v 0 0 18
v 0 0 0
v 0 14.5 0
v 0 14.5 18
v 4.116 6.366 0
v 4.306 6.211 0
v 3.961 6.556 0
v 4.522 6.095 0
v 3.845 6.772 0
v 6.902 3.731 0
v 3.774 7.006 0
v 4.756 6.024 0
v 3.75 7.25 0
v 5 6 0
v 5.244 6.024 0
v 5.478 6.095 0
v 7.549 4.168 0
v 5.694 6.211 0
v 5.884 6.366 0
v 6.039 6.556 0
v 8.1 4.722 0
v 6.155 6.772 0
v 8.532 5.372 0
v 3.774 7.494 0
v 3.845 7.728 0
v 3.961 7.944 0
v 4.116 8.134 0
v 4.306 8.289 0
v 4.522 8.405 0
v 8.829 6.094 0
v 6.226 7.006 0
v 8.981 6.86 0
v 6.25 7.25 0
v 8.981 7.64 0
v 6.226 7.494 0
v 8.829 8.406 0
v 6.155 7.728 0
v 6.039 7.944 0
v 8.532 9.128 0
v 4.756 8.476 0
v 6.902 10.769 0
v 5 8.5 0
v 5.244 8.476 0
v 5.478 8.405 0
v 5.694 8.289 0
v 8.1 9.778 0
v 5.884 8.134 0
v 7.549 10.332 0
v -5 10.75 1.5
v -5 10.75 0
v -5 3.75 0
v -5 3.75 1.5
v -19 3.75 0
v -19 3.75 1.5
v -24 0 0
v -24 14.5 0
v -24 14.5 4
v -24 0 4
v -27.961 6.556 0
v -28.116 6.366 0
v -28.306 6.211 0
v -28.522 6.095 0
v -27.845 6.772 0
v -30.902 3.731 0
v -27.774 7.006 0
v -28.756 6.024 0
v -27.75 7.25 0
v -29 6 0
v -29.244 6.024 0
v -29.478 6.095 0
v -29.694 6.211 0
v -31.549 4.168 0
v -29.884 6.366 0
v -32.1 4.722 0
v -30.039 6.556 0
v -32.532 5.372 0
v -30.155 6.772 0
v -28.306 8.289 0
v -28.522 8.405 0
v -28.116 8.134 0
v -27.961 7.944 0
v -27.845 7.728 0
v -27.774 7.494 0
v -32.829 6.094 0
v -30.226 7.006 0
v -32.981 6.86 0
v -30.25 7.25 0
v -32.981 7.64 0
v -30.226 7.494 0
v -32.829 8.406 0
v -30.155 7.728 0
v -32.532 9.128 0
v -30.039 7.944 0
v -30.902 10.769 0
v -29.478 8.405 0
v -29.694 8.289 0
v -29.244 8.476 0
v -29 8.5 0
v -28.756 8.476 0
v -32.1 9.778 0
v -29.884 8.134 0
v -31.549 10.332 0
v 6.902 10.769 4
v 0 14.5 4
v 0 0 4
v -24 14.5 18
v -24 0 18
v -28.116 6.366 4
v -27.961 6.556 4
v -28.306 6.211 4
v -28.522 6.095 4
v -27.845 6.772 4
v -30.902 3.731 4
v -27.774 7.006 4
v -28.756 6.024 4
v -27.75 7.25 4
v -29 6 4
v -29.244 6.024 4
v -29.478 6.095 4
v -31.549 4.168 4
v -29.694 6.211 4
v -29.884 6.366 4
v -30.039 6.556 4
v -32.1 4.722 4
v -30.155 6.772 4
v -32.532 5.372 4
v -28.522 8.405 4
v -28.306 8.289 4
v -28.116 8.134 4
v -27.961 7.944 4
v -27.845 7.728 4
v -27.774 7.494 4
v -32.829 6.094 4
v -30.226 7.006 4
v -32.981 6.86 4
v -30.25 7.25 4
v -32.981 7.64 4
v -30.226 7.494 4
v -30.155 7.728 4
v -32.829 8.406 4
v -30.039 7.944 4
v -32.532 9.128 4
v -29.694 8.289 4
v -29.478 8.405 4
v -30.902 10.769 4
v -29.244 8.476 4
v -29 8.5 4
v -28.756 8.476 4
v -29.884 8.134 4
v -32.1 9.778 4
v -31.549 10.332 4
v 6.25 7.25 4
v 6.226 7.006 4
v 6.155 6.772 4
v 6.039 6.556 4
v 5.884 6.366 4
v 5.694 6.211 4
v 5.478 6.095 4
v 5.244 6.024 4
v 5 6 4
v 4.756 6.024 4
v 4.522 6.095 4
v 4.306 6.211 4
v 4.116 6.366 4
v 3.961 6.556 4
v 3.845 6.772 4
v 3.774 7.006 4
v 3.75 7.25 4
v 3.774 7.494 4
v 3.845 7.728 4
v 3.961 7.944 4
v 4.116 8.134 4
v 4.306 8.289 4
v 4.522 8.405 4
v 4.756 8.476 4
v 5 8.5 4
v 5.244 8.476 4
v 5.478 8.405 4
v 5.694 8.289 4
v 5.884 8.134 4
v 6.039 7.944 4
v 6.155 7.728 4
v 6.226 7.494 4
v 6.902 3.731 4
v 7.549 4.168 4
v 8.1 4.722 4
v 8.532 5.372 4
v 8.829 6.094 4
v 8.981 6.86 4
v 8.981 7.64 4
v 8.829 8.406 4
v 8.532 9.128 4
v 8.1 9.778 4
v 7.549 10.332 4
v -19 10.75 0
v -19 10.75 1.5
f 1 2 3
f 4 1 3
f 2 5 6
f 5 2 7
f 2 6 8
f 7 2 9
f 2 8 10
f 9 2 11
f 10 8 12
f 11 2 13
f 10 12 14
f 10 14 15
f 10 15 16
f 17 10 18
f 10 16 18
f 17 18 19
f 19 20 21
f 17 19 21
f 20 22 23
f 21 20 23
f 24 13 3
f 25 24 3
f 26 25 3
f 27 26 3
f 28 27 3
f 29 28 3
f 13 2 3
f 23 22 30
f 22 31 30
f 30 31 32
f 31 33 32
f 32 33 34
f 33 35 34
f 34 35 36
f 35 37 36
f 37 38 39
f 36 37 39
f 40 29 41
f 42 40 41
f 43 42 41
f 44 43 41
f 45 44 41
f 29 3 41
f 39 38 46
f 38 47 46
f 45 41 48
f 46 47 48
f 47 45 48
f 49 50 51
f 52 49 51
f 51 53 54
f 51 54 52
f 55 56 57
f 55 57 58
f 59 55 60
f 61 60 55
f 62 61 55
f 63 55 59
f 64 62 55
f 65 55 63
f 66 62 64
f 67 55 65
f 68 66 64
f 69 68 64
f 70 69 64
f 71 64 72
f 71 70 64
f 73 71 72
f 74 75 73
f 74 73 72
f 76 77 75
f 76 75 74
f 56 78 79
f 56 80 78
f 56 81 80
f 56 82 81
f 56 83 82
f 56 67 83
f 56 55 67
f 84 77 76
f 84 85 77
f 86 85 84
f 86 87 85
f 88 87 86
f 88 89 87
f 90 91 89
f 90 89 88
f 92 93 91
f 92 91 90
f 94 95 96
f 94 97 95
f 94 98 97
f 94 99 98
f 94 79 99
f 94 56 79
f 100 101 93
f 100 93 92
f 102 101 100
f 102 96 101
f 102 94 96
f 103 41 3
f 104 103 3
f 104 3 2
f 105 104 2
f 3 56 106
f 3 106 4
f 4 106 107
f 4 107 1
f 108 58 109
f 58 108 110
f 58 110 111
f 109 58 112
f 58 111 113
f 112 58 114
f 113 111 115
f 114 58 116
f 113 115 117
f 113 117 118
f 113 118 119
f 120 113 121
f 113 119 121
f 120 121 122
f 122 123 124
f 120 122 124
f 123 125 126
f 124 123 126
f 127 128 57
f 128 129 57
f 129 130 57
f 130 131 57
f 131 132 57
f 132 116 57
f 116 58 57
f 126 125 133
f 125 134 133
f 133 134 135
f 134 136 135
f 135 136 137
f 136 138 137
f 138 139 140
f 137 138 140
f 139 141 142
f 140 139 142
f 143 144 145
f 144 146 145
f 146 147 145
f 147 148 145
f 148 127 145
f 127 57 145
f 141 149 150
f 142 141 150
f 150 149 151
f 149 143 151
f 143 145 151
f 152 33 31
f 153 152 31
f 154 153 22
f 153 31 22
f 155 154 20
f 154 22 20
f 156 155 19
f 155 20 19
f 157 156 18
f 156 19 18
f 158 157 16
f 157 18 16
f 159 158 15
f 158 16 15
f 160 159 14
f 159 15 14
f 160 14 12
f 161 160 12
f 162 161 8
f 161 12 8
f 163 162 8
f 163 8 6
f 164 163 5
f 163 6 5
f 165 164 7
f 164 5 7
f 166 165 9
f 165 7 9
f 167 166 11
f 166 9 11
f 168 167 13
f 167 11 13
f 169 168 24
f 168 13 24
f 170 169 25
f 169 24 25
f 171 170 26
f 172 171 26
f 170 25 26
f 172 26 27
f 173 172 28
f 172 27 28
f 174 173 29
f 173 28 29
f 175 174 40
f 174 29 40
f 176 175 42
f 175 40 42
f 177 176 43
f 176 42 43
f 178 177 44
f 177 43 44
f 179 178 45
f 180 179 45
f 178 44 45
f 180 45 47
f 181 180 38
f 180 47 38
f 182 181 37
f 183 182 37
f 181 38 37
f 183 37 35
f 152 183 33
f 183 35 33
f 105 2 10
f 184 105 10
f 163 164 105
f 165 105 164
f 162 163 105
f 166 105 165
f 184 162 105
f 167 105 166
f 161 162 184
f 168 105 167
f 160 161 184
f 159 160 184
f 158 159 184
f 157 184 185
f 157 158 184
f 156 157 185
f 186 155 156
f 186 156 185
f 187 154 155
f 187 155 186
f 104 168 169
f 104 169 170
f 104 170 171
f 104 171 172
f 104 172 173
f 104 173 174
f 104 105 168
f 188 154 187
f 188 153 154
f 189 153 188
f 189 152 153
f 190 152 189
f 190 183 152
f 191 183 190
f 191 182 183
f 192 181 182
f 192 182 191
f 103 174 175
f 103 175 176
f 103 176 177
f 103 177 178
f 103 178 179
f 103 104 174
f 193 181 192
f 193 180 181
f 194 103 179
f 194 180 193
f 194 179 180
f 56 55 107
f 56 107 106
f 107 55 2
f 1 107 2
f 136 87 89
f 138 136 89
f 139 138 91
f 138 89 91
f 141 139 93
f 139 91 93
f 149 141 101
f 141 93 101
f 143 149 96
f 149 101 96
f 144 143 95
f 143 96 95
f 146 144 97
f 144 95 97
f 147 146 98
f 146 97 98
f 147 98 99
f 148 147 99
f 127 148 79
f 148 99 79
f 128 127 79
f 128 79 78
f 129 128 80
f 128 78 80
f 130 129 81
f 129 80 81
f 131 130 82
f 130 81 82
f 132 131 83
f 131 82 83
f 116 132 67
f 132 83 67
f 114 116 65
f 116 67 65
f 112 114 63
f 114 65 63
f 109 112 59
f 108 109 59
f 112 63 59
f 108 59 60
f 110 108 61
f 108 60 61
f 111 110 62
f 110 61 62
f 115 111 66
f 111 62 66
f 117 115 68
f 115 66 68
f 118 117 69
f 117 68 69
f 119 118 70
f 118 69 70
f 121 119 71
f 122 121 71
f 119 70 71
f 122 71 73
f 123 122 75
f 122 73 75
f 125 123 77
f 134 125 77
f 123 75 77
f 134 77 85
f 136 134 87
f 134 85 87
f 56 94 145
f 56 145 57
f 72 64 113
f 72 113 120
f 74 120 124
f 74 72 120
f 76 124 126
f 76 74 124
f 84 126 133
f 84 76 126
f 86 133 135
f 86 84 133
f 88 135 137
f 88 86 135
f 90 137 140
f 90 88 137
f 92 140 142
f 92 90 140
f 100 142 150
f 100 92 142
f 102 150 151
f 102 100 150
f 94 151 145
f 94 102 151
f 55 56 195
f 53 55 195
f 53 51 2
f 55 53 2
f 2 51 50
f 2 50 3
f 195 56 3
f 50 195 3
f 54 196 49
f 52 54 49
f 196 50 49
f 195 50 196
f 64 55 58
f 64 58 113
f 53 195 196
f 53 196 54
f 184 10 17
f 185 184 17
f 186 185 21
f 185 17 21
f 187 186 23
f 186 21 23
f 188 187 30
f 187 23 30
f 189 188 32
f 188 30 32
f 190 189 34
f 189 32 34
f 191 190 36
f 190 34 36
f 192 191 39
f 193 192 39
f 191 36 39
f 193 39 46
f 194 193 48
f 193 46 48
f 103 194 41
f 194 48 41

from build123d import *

# Parameters (mm, degrees)
SKETCH_1_W          = 24
SKETCH_1_H          = 14.5
EXTRUDE_1_DEPTH     = 18
SKETCH_2_R          = 1.25
EXTRUDE_2_DEPTH     = 4
EXTRUDE_2_2_DEPTH   = 4
CUT_EXTRUDE_1_DEPTH = 1.5


with BuildPart() as part:
    # Эскиз1 → Бобышка-Вытянуть1 (new body)
    with BuildSketch(Plane.XY):
        with Locations((-12, 7.25)):
            Rectangle(SKETCH_1_W, SKETCH_1_H)
    extrude(amount=EXTRUDE_1_DEPTH)

    # Эскиз3 → Вырез-Вытянуть1 (cut)
    with BuildSketch(Plane(origin=(0, 0, 0), x_dir=(-1, 0, 0), z_dir=(0, 0, -1))):
        Polygon((5, 7.25), (5, 10.75), (19, 10.75), (19, 3.75), (5, 3.75), align=None)
    extrude(amount=-CUT_EXTRUDE_1_DEPTH, mode=Mode.SUBTRACT)


with BuildPart() as body_2:
    # Эскиз2 → Бобышка-Вытянуть2 (new body)
    with BuildSketch(Plane(origin=(0, 0, 0), x_dir=(-1, 0, 0), z_dir=(0, 0, -1))):
        with BuildLine():
            Line((24, 14.5), (24, 0))
            Line((24, 0), (30.902196873, 3.731243536))
            ThreePointArc((30.902196873, 3.731243536), (33, 7.25), (30.902196873, 10.768756464))
            Line((30.902196873, 10.768756464), (24, 14.5))
        make_face()
        with Locations((29, 7.25)):
            Circle(SKETCH_2_R, mode=Mode.SUBTRACT)
    extrude(amount=-EXTRUDE_2_DEPTH)


with BuildPart() as body_3:
    # Эскиз2 → Extrude 2 2 (new body)
    with BuildSketch(Plane(origin=(0, 0, 0), x_dir=(-1, 0, 0), z_dir=(0, 0, -1))):
        with BuildLine():
            Line((0, 0), (-6.902196873, 3.731243536))
            ThreePointArc((-6.902196873, 3.731243536), (-9, 7.25), (-6.902196873, 10.768756464))
            Line((-6.902196873, 10.768756464), (0, 14.5))
            Line((0, 14.5), (0, 0))
        make_face()
        with Locations(Location((-5, 7.25, 0), (0, 0, 180))):
            Circle(SKETCH_2_R, mode=Mode.SUBTRACT)
    extrude(amount=-EXTRUDE_2_2_DEPTH)


solid = Compound([part.part, body_2.part, body_3.part])
